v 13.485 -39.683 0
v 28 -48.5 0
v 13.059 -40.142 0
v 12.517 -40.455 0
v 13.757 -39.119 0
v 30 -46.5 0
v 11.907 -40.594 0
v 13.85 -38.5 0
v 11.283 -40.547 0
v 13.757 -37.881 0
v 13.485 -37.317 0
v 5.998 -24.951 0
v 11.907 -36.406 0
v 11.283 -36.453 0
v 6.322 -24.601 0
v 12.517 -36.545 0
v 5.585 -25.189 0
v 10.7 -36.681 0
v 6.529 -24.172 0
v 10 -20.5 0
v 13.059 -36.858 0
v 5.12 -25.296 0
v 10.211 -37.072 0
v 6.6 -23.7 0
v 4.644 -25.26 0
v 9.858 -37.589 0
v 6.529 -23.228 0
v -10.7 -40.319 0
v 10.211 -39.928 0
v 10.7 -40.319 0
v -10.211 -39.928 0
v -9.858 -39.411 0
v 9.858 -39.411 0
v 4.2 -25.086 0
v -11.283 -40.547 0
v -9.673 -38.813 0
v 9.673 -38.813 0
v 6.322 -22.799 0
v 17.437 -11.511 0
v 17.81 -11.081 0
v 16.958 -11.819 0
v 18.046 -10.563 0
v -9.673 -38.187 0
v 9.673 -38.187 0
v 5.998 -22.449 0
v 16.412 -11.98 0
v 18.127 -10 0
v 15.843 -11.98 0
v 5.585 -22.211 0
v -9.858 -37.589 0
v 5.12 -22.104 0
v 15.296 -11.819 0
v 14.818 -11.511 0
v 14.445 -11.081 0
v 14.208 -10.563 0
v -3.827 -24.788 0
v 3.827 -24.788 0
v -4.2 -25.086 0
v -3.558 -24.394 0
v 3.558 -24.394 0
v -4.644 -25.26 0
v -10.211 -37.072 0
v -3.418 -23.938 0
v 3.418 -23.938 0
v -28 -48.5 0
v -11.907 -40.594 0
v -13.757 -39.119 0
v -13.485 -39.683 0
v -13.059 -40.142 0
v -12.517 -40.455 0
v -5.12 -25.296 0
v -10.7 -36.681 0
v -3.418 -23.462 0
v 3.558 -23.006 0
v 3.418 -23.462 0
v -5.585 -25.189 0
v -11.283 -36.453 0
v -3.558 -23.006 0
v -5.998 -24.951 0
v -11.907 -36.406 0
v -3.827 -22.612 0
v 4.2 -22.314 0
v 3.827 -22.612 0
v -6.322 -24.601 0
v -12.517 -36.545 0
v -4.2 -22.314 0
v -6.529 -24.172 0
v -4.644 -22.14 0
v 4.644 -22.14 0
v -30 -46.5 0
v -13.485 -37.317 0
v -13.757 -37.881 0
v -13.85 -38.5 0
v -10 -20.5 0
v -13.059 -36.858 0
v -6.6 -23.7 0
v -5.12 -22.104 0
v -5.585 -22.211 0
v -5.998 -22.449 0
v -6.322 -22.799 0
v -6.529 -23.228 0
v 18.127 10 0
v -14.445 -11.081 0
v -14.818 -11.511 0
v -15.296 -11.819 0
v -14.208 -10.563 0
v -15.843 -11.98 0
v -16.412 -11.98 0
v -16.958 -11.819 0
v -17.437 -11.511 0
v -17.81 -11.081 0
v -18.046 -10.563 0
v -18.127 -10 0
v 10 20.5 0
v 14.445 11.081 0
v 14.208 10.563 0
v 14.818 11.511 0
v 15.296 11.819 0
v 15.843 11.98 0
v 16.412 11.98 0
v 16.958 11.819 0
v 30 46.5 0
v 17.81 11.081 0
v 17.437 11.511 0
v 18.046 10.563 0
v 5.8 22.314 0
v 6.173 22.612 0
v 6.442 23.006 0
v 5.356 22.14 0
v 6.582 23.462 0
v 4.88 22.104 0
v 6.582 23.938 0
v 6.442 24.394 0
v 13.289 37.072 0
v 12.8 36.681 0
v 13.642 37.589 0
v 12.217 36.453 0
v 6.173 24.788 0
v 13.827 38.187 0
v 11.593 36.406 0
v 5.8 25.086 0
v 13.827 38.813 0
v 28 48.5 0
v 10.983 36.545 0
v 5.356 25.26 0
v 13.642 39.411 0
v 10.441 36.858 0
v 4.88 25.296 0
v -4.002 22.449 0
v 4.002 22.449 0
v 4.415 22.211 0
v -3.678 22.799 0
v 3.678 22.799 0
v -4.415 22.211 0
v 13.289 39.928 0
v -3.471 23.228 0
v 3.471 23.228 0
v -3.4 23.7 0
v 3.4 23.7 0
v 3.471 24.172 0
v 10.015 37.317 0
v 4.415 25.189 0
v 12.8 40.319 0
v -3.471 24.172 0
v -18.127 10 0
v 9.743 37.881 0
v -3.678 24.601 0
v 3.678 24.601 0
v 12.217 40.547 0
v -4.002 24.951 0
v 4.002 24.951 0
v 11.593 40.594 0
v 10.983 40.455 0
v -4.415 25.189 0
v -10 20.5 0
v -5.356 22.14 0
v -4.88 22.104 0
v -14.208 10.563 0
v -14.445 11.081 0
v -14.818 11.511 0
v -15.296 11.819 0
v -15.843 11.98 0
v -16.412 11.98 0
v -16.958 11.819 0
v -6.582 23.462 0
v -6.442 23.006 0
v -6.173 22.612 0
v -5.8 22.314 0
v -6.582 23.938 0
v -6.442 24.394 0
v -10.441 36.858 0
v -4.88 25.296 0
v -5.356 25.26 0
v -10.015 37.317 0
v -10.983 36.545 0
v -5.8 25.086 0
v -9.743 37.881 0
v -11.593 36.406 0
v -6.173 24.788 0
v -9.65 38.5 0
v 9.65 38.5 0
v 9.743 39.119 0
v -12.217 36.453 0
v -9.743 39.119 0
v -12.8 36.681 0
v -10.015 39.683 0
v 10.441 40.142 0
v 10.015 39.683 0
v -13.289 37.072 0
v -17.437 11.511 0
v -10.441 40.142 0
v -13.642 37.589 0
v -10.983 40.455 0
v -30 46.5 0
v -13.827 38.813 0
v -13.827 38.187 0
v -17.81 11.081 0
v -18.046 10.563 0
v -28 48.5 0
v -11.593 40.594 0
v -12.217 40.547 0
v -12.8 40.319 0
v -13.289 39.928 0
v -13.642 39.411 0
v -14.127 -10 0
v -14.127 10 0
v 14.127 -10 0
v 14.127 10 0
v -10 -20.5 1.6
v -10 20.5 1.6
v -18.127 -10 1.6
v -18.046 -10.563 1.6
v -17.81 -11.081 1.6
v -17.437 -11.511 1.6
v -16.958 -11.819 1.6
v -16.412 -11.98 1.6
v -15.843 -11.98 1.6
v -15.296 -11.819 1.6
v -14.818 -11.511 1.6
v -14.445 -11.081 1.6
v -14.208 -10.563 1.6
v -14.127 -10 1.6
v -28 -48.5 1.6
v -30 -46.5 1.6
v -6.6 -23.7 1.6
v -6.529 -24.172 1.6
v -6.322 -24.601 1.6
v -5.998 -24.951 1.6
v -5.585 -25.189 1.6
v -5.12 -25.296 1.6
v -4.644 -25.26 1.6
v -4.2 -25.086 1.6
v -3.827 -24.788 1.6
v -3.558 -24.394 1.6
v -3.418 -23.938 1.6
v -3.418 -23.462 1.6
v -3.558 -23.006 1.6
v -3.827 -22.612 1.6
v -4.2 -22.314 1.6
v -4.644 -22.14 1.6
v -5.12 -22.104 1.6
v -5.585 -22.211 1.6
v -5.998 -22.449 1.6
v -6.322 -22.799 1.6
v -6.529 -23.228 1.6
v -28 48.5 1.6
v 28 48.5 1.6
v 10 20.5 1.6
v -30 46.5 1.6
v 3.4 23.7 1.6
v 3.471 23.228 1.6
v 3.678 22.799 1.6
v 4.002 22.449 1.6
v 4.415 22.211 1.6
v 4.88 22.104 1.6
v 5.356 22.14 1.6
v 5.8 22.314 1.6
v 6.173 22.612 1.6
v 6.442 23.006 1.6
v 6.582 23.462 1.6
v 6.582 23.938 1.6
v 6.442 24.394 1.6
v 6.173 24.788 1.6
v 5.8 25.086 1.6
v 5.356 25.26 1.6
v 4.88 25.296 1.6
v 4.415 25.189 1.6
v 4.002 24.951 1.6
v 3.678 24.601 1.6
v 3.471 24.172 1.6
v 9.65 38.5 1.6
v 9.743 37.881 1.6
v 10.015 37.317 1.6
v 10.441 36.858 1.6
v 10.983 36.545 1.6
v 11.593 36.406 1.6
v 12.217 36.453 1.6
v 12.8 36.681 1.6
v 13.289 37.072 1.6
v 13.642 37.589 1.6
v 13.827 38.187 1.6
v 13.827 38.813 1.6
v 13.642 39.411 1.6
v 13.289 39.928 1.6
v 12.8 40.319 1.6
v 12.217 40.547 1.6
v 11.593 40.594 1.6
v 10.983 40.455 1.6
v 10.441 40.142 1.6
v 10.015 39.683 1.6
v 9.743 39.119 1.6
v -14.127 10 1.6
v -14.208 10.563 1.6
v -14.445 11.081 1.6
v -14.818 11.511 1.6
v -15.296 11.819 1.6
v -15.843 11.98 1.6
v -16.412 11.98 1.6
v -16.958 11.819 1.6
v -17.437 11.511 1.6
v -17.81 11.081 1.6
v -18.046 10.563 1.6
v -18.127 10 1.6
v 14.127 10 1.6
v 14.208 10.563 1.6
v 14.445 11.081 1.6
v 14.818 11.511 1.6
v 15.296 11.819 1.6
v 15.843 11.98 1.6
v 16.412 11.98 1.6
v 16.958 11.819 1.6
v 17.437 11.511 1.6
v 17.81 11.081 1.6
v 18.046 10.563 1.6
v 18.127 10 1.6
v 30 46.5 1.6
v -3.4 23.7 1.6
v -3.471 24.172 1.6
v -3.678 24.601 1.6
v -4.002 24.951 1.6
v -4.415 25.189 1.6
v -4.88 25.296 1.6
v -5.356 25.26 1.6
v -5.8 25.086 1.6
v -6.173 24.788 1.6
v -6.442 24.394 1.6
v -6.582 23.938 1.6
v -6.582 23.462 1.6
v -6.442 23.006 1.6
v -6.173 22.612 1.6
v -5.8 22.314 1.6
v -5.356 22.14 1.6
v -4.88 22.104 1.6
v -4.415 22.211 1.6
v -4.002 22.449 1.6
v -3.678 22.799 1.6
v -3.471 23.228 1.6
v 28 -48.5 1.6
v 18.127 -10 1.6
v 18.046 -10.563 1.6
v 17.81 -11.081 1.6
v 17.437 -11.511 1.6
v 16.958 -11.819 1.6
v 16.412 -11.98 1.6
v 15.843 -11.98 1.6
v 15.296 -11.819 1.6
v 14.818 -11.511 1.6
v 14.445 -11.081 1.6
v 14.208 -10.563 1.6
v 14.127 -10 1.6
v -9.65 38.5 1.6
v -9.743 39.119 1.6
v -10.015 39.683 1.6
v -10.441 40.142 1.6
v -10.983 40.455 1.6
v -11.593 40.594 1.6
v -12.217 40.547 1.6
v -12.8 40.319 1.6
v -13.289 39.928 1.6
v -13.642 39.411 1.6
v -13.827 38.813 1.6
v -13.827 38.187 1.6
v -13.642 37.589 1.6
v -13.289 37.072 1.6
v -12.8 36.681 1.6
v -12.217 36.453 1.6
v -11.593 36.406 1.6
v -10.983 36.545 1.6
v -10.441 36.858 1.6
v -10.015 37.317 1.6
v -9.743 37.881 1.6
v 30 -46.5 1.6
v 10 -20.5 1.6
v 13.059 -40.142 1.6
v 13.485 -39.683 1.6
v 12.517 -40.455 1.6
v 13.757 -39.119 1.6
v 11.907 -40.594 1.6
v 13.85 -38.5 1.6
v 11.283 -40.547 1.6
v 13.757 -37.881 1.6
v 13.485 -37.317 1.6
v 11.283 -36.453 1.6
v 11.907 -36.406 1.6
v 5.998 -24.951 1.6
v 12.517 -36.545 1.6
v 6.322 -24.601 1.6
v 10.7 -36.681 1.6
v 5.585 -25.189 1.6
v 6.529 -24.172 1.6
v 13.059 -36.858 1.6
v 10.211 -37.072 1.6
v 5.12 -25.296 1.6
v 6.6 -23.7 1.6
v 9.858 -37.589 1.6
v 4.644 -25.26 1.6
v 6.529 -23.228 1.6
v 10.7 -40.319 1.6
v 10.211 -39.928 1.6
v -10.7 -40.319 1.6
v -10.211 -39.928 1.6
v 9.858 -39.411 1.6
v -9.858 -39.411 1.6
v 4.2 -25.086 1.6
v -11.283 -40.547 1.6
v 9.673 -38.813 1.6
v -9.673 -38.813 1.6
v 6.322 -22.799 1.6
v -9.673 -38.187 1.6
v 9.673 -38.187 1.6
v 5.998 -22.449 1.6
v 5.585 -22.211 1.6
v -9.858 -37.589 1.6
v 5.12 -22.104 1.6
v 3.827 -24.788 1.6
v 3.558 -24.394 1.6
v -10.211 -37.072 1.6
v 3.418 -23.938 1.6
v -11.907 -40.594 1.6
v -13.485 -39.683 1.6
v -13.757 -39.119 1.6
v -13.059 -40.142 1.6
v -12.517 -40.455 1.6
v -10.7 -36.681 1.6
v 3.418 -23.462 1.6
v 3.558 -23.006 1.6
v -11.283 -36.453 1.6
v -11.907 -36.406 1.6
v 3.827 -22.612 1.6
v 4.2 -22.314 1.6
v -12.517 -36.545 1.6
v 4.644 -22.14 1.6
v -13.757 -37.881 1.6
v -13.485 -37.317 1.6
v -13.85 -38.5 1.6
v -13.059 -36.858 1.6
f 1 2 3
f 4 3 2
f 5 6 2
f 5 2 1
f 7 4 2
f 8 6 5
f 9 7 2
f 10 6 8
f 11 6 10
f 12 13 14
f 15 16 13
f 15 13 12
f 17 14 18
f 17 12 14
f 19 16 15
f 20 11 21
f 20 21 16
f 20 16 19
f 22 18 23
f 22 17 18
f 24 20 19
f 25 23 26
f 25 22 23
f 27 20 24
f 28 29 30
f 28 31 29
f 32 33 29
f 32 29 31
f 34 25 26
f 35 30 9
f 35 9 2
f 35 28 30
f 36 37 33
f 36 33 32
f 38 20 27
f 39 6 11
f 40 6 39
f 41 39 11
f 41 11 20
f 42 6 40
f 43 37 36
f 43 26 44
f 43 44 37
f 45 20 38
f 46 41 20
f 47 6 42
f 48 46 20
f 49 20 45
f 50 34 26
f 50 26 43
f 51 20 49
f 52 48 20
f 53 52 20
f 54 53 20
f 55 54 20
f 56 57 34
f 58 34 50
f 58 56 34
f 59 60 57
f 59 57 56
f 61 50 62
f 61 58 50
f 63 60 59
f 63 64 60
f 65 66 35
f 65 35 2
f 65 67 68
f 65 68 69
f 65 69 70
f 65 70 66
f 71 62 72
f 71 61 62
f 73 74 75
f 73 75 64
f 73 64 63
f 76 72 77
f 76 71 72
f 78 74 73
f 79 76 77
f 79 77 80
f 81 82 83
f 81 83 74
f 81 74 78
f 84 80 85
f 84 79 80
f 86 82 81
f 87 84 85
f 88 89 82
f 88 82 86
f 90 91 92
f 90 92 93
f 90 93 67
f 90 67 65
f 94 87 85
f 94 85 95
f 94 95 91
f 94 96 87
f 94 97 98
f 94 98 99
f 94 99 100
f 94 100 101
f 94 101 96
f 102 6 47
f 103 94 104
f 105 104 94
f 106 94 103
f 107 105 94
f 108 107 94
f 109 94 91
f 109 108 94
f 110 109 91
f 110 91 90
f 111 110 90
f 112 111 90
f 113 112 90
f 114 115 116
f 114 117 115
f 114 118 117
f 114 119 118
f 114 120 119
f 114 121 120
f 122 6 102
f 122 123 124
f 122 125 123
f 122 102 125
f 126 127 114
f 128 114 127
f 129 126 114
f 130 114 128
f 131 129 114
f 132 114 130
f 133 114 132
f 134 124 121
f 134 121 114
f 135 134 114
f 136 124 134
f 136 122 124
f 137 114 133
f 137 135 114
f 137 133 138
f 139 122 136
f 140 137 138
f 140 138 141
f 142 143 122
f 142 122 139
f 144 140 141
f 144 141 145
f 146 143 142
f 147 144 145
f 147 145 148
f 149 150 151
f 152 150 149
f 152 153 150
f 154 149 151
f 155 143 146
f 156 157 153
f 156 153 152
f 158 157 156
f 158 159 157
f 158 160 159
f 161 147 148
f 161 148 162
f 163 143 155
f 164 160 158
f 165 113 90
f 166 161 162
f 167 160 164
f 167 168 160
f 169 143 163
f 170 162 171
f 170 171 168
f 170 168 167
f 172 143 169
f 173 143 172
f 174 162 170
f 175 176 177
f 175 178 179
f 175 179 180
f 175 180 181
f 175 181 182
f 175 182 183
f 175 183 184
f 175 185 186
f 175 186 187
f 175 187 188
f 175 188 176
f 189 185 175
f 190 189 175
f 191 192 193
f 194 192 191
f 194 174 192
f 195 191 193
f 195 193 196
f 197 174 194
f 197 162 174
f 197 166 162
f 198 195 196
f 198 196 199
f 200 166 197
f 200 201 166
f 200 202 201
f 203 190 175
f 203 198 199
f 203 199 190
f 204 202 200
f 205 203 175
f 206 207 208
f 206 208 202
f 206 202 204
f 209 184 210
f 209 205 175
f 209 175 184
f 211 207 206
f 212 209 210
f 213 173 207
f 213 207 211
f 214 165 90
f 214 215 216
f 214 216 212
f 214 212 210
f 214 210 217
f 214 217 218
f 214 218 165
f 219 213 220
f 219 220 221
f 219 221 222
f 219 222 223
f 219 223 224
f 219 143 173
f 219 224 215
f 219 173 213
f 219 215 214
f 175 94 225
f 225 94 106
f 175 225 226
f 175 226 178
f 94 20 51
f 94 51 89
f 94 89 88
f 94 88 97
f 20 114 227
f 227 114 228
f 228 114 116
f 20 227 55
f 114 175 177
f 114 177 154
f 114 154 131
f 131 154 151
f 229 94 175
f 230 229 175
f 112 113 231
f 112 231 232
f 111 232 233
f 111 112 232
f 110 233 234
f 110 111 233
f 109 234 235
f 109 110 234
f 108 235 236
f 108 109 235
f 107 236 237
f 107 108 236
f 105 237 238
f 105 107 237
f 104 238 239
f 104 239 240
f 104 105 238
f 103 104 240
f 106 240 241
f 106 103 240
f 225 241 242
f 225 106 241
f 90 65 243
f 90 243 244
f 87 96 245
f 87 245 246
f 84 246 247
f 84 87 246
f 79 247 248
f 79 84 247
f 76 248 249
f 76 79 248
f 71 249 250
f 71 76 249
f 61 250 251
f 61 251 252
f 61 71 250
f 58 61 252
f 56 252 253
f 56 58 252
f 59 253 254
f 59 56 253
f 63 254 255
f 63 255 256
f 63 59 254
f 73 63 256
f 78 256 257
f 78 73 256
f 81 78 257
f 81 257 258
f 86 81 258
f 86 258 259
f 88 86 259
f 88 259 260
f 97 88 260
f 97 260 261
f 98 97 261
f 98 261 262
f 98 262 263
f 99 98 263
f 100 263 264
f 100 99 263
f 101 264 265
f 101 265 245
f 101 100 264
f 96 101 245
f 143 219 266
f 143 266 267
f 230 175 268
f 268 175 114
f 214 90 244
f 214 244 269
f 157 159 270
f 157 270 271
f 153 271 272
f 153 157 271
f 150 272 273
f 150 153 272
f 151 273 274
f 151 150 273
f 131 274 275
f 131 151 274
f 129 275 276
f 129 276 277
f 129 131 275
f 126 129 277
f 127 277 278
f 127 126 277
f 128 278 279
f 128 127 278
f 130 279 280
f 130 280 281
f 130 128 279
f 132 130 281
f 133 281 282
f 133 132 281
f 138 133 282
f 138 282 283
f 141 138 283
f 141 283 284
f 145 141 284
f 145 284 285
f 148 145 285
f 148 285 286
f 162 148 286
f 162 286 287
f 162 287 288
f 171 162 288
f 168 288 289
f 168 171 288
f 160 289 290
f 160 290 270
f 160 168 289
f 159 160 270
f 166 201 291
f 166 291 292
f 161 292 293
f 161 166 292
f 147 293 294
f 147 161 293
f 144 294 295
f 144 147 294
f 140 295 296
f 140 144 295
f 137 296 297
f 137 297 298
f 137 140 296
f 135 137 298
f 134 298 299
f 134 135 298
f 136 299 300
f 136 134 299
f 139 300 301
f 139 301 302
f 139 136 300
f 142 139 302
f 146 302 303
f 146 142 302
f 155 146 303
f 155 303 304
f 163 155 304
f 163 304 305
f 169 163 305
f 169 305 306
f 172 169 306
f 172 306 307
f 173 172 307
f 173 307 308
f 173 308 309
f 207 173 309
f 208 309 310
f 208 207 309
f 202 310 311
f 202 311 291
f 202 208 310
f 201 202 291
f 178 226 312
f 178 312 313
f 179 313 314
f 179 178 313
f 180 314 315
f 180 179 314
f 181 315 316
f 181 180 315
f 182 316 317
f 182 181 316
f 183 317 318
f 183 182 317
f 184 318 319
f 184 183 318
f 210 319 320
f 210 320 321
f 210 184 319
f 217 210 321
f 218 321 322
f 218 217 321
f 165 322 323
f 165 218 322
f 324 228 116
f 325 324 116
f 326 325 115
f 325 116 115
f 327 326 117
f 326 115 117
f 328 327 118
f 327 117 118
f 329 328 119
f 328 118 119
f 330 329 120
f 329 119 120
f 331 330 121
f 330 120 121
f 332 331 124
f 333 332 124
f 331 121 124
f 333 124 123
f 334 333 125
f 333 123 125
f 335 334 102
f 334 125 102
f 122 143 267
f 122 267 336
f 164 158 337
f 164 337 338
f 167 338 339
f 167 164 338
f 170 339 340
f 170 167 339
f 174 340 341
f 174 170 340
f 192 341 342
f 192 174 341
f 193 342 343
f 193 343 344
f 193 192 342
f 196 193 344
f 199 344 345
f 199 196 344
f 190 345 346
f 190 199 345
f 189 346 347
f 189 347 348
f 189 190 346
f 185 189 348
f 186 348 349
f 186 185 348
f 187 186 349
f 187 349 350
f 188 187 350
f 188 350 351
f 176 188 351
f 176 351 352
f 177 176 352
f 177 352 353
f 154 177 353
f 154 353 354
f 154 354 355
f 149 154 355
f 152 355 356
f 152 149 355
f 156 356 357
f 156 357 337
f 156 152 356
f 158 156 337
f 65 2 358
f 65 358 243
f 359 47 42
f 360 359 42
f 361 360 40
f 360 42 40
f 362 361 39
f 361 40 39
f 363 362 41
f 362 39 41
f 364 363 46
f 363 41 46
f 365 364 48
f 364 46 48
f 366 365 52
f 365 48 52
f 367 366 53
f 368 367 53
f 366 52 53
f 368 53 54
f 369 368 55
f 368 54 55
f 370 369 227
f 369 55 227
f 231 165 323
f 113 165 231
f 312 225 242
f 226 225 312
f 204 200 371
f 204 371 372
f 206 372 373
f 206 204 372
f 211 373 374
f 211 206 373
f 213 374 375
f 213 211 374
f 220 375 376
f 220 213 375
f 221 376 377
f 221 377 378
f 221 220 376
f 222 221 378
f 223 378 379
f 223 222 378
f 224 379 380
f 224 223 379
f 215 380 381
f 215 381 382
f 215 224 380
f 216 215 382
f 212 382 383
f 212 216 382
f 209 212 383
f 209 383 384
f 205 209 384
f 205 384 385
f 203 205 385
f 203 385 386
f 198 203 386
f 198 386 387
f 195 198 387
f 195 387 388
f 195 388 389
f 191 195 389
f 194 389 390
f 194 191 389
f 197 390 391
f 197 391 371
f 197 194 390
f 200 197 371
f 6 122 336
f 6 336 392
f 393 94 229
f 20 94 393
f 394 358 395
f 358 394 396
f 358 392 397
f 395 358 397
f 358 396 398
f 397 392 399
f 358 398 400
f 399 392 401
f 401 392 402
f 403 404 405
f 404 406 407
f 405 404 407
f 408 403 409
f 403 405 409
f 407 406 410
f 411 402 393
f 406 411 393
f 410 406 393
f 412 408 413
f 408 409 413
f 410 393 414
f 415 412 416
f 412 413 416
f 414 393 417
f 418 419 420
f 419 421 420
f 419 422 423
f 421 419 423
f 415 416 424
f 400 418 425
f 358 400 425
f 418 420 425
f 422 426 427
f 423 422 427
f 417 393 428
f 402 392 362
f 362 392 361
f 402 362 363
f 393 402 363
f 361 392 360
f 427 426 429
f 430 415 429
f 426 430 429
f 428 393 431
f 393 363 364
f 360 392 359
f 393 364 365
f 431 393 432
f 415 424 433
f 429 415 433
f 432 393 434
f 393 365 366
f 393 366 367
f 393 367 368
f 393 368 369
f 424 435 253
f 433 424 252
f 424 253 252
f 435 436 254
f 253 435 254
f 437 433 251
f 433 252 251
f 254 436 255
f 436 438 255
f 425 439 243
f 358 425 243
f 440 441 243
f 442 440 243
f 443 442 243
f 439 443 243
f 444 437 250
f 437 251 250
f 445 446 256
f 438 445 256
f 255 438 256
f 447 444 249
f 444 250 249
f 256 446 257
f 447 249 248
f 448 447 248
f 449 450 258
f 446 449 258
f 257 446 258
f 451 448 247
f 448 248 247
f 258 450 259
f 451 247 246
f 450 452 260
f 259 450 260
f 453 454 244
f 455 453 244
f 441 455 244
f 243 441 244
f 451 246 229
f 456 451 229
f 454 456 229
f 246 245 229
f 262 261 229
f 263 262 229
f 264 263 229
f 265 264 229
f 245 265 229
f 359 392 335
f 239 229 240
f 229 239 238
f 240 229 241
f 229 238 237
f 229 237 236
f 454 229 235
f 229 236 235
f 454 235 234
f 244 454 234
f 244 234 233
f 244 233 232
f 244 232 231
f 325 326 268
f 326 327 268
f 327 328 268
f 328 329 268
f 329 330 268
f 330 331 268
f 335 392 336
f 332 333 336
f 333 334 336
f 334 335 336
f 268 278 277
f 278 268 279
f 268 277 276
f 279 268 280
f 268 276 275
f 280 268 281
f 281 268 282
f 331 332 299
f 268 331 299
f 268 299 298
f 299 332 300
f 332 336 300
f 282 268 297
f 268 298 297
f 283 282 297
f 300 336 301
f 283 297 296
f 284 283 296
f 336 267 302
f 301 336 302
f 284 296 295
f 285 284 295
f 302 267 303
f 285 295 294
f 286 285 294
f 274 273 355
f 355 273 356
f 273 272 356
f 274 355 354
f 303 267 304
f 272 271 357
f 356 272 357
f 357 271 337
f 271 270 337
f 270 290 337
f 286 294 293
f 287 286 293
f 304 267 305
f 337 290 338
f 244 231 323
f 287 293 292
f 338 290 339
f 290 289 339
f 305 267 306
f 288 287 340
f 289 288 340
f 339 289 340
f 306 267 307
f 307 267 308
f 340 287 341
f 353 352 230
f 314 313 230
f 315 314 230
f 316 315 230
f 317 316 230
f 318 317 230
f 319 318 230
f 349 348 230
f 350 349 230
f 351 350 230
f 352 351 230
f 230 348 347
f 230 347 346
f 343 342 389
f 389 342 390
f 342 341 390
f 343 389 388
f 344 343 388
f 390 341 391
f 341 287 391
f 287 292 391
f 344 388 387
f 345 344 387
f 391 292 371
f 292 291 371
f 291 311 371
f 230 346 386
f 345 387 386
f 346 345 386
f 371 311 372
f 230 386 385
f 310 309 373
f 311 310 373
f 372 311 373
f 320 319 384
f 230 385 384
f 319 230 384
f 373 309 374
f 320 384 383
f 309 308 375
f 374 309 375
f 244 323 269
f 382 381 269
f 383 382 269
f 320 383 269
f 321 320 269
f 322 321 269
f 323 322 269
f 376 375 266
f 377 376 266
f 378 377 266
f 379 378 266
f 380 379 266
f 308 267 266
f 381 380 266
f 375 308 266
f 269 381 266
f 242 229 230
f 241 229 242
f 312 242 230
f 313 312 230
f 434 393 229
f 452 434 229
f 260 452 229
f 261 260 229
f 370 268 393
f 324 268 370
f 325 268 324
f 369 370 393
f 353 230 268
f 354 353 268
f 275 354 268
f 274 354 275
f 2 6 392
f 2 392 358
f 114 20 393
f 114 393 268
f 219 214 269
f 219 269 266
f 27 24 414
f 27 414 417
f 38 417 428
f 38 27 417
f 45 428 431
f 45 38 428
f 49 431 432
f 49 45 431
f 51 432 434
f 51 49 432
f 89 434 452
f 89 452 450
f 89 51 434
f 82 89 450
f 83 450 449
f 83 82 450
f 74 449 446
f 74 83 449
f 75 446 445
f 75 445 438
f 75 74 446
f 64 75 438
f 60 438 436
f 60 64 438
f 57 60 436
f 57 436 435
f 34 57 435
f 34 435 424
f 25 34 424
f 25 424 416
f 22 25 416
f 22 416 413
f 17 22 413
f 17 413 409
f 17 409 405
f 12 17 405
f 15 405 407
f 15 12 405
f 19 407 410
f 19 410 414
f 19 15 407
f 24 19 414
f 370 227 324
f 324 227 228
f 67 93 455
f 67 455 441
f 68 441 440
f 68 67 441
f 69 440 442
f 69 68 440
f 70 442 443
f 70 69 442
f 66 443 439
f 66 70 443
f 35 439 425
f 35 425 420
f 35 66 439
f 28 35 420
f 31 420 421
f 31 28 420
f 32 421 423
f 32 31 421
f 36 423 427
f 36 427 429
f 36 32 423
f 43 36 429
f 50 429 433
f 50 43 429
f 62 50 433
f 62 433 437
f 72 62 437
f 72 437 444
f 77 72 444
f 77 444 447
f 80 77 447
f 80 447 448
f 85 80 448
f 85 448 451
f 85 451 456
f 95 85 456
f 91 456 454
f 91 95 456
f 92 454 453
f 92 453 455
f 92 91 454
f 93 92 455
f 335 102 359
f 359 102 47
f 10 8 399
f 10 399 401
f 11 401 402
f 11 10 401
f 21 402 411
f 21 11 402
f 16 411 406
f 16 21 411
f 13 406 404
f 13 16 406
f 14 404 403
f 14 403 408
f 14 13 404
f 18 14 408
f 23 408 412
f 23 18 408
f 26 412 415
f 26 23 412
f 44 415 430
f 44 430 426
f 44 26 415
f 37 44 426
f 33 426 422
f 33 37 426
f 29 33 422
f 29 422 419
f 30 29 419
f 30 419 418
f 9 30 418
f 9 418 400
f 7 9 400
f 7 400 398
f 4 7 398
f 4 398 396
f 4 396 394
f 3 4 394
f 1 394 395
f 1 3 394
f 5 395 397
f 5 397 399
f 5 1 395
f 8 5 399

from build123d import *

# Parameters (mm, degrees)
SKETCH_1_R      = 2.1
SKETCH_1_R_2    = 1.6
SKETCH_1_W      = 20
SKETCH_1_H      = 41
EXTRUDE_1_DEPTH = 1.6


with BuildPart() as part:
    # 草图1 → 凸台-拉伸1 (new body)
    with BuildSketch(Plane.XY):
        Polygon((-30, 46.5), (-28, 48.5), (28, 48.5), (30, 46.5), (30, -46.5), (28, -48.5), (-28, -48.5), (-30, -46.5), align=None)
        with Locations((-11.75, 38.5)):
            Circle(SKETCH_1_R, mode=Mode.SUBTRACT)
        with Locations((-5, 23.7)):
            Circle(SKETCH_1_R_2, mode=Mode.SUBTRACT)
        with Locations(Location((-5, -23.7, 0), (0, 0, 180))):
            Circle(SKETCH_1_R_2, mode=Mode.SUBTRACT)
        with Locations(Location((-11.75, -38.5, 0), (0, 0, 180))):
            Circle(SKETCH_1_R, mode=Mode.SUBTRACT)
        with Locations((11.75, -38.5)):
            Circle(SKETCH_1_R, mode=Mode.SUBTRACT)
        with Locations((5, -23.7)):
            Circle(SKETCH_1_R_2, mode=Mode.SUBTRACT)
        with Locations(Location((5, 23.7, 0), (0, 0, 180))):
            Circle(SKETCH_1_R_2, mode=Mode.SUBTRACT)
        with Locations(Location((11.75, 38.5, 0), (0, 0, 180))):
            Circle(SKETCH_1_R, mode=Mode.SUBTRACT)
        with BuildLine():
            Line((-18.12722641, 10), (-18.12722641, -10))
            ThreePointArc((-18.12722641, -10), (-16.12722641, -12), (-14.12722641, -10))
            Line((-14.12722641, -10), (-14.12722641, 10))
            ThreePointArc((-14.12722641, 10), (-16.12722641, 12), (-18.12722641, 10))
        make_face(mode=Mode.SUBTRACT)
        Rectangle(SKETCH_1_W, SKETCH_1_H, mode=Mode.SUBTRACT)
        with BuildLine():
            Line((18.12722641, 10), (18.12722641, -10))
            ThreePointArc((18.12722641, -10), (16.12722641, -12), (14.12722641, -10))
            Line((14.12722641, -10), (14.12722641, 10))
            ThreePointArc((14.12722641, 10), (16.12722641, 12), (18.12722641, 10))
        make_face(mode=Mode.SUBTRACT)
    extrude(amount=EXTRUDE_1_DEPTH)


solid = part.part
